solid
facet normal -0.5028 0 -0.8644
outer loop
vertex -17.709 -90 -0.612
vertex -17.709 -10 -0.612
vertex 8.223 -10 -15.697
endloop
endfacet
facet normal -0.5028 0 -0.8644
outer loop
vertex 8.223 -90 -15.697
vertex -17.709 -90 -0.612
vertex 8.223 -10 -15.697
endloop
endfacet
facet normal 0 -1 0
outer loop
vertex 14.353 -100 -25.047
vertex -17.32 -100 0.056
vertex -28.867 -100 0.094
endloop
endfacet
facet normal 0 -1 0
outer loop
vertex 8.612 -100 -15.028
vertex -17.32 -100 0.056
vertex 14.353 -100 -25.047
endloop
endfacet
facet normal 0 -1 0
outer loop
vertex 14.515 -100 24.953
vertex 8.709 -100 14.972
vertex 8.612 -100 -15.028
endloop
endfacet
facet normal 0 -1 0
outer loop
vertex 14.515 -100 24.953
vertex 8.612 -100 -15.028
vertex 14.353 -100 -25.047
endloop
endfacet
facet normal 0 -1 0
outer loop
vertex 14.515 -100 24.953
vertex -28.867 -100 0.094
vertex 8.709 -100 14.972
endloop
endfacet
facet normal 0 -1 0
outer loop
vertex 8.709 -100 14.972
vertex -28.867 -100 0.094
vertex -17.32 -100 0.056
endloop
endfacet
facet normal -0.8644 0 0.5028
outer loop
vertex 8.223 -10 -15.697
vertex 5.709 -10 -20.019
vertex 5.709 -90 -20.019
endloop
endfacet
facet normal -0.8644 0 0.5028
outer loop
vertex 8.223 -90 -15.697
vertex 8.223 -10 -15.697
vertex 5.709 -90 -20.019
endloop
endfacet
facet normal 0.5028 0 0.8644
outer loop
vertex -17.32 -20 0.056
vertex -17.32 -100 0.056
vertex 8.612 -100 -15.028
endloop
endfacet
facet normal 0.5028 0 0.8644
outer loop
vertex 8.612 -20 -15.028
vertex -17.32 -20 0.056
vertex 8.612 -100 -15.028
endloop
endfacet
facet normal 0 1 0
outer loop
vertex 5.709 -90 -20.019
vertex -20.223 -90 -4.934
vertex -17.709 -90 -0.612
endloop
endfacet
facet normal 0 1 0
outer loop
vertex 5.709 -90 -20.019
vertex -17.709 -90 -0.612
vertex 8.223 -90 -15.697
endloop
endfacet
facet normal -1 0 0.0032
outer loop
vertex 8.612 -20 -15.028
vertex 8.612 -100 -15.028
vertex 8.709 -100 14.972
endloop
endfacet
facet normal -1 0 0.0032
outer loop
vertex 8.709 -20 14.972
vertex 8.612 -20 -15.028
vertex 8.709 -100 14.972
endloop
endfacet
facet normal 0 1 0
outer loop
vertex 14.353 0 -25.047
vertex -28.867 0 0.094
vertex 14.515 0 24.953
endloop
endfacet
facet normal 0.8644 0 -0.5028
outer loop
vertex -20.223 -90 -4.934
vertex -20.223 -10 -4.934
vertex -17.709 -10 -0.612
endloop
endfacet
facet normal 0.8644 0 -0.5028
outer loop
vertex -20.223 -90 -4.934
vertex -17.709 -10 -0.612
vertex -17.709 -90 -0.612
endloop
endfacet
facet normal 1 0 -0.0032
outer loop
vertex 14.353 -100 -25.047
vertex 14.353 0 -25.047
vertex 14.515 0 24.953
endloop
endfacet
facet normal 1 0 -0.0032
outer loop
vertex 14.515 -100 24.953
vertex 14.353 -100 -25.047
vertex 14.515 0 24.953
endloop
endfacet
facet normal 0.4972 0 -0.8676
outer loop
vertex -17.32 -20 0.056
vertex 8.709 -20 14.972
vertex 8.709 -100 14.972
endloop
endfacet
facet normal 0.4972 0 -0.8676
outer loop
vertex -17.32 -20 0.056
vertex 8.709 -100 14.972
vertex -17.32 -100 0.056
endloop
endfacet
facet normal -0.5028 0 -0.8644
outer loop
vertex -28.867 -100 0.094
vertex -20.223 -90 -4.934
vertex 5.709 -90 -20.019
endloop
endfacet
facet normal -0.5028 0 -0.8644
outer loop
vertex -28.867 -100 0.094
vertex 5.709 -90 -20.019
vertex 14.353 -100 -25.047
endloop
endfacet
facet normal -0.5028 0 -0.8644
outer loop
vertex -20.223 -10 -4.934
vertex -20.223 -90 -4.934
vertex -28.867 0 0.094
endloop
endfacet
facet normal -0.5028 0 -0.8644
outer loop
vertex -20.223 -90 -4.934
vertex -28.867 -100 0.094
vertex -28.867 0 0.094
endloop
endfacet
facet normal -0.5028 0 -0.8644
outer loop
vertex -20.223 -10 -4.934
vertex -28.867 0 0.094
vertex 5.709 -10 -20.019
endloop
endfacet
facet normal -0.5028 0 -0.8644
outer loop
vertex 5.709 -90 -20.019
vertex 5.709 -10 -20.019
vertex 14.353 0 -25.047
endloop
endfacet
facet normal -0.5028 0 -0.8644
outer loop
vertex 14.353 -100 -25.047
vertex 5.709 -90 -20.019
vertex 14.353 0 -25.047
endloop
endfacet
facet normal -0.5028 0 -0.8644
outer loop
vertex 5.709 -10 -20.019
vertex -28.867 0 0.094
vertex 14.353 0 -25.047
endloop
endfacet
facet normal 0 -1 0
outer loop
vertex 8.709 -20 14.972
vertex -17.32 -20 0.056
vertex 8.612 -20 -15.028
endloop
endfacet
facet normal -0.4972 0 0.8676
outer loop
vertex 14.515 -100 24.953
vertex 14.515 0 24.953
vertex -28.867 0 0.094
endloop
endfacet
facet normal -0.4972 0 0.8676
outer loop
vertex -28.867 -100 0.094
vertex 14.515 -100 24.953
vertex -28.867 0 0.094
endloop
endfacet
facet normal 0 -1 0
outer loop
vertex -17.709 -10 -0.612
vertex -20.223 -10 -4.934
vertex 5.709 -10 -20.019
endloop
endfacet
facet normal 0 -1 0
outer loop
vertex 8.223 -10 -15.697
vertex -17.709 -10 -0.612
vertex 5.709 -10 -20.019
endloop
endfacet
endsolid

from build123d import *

# Parameters (mm, degrees)
F1_DEPTH = 100
F2_W     = 30
F2_H     = 80
F3_DEPTH = 5
F5_DEPTH = 80


with BuildPart() as f1:
    # F0 (on Front) → F1 (new body)
    with BuildSketch(Plane.XZ):
        Polygon((14.5147677447, 24.9530529325), (-28.8673616138, 0.0936311307), (14.3525938692, -25.0466840632), align=None)
    extrude(amount=F1_DEPTH)

    # F2 (on face) → F3 (cut)
    with BuildSketch(Plane(origin=(-7.2573838723, 0, -12.4765264662), x_dir=(0.8643991097, 0, -0.5028063039), z_dir=(-0.5028063039, 0, -0.8643991097))):
        with Locations((0, 50)):
            Rectangle(F2_W, F2_H)
    extrude(amount=-F3_DEPTH, mode=Mode.SUBTRACT)

    # F4 (on face) → F5 (cut)
    with BuildSketch(Plane.XZ.offset(100)):
        Polygon((8.7088606468, 14.9718317595), (-17.3204169683, 0.0561786784), (8.6115563215, -15.0280104379), align=None)
    extrude(amount=-F5_DEPTH, mode=Mode.SUBTRACT)


solid = f1.part
